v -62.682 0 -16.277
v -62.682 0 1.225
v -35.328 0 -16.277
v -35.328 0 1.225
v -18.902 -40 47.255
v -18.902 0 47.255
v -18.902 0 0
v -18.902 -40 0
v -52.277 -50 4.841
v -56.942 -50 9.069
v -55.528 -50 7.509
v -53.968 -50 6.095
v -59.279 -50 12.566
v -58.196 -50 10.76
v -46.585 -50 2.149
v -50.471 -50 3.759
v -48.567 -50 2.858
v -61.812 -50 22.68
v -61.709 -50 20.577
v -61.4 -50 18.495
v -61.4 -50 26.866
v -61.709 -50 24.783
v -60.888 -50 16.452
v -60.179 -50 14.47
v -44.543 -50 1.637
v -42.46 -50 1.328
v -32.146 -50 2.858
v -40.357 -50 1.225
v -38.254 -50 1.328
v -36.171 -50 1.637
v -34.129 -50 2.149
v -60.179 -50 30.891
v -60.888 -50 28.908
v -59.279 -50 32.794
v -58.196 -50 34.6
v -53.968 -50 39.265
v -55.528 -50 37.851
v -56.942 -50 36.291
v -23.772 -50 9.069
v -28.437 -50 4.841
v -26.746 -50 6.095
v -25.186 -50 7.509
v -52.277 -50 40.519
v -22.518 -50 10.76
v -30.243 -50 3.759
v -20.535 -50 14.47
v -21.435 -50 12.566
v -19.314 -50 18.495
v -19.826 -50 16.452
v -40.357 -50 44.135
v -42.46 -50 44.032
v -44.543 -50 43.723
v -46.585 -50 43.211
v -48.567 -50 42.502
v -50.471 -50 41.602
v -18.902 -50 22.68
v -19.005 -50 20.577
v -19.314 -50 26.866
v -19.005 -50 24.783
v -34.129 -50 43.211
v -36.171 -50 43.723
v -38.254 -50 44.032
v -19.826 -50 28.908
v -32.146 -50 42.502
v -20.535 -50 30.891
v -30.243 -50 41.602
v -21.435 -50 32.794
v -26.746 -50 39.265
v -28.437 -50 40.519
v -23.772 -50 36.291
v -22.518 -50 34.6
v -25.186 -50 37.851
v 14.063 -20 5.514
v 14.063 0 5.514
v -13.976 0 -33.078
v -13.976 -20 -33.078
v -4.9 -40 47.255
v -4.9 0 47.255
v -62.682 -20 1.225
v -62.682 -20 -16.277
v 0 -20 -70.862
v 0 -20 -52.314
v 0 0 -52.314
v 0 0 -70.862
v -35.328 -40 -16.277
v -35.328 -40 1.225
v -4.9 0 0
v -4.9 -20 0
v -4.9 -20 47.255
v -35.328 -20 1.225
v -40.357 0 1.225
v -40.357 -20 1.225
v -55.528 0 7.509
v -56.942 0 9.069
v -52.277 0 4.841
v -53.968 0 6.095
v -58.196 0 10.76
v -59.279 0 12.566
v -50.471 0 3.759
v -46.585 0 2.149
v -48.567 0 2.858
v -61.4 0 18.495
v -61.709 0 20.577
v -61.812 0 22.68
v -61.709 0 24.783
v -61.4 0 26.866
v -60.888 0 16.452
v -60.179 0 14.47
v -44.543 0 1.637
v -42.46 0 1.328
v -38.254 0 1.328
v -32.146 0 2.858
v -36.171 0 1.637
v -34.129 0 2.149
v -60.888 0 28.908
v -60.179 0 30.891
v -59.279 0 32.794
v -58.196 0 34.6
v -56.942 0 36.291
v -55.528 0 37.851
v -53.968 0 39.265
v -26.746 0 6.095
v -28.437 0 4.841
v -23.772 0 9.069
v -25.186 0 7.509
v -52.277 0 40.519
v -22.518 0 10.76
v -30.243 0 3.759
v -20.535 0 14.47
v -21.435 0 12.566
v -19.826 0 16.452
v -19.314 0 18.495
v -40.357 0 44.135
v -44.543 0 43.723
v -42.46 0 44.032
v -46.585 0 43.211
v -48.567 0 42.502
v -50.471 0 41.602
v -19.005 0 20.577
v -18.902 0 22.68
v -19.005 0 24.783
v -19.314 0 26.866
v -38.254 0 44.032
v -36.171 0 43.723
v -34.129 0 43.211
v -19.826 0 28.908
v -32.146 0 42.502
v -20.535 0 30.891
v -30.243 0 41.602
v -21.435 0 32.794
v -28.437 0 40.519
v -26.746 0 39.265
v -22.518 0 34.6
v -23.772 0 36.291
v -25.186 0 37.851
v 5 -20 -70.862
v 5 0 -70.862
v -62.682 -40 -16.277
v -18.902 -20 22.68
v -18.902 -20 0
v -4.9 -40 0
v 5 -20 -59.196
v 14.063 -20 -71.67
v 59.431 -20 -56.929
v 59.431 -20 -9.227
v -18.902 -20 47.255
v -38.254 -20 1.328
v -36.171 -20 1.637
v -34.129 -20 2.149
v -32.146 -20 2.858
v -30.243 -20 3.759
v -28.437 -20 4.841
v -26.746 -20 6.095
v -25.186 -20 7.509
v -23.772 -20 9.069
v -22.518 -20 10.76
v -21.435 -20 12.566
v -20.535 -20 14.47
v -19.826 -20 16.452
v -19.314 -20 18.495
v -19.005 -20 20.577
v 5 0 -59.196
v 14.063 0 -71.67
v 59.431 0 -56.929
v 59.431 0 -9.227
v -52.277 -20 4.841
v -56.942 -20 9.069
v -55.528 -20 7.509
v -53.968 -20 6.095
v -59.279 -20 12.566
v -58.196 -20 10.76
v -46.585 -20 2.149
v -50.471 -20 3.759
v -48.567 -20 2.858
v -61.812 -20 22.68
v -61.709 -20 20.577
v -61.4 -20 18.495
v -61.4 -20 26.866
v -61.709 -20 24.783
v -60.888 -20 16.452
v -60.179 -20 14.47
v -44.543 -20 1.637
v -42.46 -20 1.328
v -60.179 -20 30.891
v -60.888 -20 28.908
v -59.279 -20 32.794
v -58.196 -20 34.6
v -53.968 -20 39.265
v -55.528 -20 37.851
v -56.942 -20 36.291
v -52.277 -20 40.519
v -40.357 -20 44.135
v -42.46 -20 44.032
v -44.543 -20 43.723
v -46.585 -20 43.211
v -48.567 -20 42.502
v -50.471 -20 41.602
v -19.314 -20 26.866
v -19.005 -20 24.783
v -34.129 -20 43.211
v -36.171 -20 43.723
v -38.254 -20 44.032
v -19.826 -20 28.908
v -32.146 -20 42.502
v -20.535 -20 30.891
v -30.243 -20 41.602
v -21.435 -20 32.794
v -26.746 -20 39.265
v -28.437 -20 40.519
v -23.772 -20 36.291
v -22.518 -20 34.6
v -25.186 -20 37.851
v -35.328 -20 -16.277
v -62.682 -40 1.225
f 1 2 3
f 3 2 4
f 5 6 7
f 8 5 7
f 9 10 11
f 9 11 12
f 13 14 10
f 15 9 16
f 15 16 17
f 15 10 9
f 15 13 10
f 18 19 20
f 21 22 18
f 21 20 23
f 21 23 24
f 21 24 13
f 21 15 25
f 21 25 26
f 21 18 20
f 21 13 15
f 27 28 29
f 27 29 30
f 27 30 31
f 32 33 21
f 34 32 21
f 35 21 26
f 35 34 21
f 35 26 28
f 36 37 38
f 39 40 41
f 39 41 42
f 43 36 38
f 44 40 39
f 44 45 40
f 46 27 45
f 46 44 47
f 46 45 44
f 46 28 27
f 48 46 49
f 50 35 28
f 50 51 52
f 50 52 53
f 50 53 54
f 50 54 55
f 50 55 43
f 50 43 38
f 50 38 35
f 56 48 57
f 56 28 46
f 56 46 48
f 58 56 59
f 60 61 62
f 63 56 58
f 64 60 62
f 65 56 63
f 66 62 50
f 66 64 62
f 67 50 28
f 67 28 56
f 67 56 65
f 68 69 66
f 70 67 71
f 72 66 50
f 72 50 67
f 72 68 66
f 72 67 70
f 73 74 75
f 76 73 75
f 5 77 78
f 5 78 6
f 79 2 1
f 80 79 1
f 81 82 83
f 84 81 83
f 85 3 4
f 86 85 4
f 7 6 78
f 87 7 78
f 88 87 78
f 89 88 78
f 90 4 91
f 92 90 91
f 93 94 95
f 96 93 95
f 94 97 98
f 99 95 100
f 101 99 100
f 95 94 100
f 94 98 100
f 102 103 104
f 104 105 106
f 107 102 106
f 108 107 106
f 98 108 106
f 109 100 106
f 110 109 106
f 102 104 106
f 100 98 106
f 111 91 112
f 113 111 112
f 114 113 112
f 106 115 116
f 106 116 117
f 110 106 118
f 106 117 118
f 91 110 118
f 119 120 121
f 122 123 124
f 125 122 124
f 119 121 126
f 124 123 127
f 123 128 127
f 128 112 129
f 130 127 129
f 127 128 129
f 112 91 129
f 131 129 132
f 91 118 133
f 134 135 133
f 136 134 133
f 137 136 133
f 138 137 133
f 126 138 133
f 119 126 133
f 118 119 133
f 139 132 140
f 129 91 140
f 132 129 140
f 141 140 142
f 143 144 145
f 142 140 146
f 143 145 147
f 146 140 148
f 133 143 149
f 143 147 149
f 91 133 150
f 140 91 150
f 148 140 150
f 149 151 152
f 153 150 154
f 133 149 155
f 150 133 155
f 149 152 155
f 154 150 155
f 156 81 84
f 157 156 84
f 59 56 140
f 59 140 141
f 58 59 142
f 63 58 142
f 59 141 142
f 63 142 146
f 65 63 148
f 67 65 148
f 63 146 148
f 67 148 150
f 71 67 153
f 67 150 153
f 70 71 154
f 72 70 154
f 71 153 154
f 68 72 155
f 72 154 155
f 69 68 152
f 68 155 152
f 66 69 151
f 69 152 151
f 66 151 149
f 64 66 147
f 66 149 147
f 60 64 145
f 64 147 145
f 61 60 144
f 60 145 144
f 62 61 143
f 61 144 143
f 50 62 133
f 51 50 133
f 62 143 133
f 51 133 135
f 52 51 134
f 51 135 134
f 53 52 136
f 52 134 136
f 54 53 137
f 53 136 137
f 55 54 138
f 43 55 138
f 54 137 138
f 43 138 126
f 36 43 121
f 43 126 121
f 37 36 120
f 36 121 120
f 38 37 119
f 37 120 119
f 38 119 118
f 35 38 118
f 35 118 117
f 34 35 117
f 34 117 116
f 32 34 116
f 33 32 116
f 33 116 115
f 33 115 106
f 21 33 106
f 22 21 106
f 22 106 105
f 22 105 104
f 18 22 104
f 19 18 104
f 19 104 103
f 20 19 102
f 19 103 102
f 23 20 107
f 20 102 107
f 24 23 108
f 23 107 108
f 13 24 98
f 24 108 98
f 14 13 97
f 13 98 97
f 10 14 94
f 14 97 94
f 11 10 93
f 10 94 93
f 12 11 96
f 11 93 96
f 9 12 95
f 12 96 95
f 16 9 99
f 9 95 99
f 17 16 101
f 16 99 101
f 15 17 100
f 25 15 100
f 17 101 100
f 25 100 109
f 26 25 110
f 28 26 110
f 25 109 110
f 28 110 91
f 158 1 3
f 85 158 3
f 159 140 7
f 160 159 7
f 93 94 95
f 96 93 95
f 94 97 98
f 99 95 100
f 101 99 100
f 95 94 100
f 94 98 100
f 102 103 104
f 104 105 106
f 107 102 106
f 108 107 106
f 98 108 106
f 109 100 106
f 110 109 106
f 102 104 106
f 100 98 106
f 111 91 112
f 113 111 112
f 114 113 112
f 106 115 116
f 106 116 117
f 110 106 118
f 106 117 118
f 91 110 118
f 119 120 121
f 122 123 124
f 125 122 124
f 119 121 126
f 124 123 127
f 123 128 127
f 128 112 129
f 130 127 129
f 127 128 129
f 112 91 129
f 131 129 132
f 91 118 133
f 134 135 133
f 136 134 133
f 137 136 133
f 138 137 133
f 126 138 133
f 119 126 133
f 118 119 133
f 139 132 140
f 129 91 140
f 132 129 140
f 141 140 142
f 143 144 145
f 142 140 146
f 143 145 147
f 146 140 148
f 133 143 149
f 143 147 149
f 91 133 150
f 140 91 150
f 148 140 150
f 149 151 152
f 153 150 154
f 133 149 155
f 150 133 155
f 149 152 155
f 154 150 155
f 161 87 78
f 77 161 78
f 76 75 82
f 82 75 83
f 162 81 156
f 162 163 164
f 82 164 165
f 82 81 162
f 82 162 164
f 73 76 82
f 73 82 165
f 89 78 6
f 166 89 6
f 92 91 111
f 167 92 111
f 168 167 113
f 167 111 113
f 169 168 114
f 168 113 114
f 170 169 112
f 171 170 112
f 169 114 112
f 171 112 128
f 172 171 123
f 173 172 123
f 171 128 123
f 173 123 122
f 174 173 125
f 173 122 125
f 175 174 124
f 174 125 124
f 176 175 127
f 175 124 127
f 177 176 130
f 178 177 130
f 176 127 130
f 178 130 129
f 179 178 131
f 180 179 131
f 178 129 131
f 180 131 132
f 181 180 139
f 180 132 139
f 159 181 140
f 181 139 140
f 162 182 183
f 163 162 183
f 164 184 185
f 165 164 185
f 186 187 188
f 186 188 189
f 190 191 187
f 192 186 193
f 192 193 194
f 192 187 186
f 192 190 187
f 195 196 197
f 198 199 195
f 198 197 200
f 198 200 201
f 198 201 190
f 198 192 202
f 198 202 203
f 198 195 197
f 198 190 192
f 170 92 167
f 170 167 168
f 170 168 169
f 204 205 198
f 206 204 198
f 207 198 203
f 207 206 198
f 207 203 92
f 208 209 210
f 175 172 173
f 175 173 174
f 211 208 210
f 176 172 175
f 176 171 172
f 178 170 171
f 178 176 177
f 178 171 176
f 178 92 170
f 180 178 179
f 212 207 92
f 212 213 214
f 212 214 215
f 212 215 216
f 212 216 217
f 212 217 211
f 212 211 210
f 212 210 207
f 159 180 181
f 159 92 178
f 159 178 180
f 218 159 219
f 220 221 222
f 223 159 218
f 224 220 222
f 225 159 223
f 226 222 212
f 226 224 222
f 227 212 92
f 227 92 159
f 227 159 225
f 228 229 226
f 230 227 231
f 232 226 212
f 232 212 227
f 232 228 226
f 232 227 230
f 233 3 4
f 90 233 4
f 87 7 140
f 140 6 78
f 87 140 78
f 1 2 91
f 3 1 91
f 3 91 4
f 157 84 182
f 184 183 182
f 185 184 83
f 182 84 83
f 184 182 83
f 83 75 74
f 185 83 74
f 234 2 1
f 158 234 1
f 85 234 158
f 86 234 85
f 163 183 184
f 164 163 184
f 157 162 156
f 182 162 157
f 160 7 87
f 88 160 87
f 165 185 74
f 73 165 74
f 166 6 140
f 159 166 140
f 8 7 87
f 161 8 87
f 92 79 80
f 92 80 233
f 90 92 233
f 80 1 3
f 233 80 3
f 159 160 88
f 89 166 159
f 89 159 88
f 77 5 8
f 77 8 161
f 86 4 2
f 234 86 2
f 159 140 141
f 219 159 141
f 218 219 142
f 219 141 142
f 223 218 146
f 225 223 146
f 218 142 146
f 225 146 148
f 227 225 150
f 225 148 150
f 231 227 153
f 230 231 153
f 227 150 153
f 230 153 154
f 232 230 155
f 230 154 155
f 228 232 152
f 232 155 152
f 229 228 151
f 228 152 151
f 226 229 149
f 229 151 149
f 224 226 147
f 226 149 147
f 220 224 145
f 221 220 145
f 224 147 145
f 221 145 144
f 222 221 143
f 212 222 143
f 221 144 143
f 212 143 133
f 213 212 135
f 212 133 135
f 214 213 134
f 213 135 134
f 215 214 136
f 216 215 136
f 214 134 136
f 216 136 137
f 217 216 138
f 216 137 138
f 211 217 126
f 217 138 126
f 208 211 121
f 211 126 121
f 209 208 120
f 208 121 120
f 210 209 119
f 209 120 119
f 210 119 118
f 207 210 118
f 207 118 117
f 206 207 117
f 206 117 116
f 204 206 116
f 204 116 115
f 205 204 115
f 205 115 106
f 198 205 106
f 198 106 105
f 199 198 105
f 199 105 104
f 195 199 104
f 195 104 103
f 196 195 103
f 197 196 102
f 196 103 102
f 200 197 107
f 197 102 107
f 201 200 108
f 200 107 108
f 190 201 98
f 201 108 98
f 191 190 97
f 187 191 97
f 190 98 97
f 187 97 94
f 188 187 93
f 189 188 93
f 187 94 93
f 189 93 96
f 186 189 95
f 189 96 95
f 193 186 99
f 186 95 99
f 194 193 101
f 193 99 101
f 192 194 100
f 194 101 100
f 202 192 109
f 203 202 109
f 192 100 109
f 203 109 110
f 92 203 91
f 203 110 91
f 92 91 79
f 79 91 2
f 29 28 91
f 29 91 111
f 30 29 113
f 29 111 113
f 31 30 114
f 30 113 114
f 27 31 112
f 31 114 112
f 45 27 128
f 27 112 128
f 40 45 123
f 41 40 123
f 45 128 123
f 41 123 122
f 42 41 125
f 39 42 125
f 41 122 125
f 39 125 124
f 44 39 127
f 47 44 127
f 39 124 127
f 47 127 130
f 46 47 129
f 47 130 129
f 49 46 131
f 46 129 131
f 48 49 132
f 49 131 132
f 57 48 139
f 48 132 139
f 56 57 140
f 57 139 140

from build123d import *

# Parameters (mm, degrees)
F1_DEPTH = 40
F2_DEPTH = 50
F3_DEPTH = 20
F4_W     = 20
F4_H     = 54.827603
F5_DEPTH = 5


with BuildPart() as f1:
    # F0 (on Front) → F1 (new body)
    with BuildSketch(Plane.XZ):
        Polygon((-18.901825, 47.254555), (-18.901825, 22.680218), (-18.901825, 0), (-4.900478, 0), (-4.900478, 47.254555), align=None)
        Polygon((-35.327843, 1.225118), (-40.356925, 1.225118), (-62.681616, 1.225118), (-62.681616, -16.276568), (-35.327843, -16.276568), align=None)
    extrude(amount=F1_DEPTH)


with BuildPart() as f2:
    # F0 (on Front) → F2 (new body)
    with BuildSketch(Plane.XZ):
        with BuildLine():
            ThreePointArc((-40.356925, 1.225118), (-25.185878, 7.509171), (-18.901825, 22.680218))
            ThreePointArc((-18.901825, 22.680218), (-55.527971, 37.851264), (-40.356925, 1.225118))
        make_face()
    extrude(amount=F2_DEPTH)


with BuildPart() as f3:
    # F0 (on Front) → F3 (new body)
    with BuildSketch(Plane.XZ):
        with BuildLine():
            ThreePointArc((-40.356925, 1.225118), (-25.185878, 7.509171), (-18.901825, 22.680218))
            ThreePointArc((-18.901825, 22.680218), (-55.527971, 37.851264), (-40.356925, 1.225118))
        make_face()
        Polygon((-18.901825, 47.254555), (-18.901825, 22.680218), (-18.901825, 0), (-4.900478, 0), (-4.900478, 47.254555), align=None)
        Polygon((-35.327843, 1.225118), (-40.356925, 1.225118), (-62.681616, 1.225118), (-62.681616, -16.276568), (-35.327843, -16.276568), align=None)
        Polygon((59.430915, -56.929383), (59.430915, -9.226989), (14.063242, 5.513861), (-13.975521, -33.078186), (14.063242, -71.670234), align=None)
    extrude(amount=F3_DEPTH)

    # F4 (on Right) → F5 (join)
    with BuildSketch(Plane.YZ):
        with Locations((-10, -43.448289)):
            Rectangle(F4_W, F4_H)
    extrude(amount=F5_DEPTH)


solid = Compound([f1.part, f2.part, f3.part])
